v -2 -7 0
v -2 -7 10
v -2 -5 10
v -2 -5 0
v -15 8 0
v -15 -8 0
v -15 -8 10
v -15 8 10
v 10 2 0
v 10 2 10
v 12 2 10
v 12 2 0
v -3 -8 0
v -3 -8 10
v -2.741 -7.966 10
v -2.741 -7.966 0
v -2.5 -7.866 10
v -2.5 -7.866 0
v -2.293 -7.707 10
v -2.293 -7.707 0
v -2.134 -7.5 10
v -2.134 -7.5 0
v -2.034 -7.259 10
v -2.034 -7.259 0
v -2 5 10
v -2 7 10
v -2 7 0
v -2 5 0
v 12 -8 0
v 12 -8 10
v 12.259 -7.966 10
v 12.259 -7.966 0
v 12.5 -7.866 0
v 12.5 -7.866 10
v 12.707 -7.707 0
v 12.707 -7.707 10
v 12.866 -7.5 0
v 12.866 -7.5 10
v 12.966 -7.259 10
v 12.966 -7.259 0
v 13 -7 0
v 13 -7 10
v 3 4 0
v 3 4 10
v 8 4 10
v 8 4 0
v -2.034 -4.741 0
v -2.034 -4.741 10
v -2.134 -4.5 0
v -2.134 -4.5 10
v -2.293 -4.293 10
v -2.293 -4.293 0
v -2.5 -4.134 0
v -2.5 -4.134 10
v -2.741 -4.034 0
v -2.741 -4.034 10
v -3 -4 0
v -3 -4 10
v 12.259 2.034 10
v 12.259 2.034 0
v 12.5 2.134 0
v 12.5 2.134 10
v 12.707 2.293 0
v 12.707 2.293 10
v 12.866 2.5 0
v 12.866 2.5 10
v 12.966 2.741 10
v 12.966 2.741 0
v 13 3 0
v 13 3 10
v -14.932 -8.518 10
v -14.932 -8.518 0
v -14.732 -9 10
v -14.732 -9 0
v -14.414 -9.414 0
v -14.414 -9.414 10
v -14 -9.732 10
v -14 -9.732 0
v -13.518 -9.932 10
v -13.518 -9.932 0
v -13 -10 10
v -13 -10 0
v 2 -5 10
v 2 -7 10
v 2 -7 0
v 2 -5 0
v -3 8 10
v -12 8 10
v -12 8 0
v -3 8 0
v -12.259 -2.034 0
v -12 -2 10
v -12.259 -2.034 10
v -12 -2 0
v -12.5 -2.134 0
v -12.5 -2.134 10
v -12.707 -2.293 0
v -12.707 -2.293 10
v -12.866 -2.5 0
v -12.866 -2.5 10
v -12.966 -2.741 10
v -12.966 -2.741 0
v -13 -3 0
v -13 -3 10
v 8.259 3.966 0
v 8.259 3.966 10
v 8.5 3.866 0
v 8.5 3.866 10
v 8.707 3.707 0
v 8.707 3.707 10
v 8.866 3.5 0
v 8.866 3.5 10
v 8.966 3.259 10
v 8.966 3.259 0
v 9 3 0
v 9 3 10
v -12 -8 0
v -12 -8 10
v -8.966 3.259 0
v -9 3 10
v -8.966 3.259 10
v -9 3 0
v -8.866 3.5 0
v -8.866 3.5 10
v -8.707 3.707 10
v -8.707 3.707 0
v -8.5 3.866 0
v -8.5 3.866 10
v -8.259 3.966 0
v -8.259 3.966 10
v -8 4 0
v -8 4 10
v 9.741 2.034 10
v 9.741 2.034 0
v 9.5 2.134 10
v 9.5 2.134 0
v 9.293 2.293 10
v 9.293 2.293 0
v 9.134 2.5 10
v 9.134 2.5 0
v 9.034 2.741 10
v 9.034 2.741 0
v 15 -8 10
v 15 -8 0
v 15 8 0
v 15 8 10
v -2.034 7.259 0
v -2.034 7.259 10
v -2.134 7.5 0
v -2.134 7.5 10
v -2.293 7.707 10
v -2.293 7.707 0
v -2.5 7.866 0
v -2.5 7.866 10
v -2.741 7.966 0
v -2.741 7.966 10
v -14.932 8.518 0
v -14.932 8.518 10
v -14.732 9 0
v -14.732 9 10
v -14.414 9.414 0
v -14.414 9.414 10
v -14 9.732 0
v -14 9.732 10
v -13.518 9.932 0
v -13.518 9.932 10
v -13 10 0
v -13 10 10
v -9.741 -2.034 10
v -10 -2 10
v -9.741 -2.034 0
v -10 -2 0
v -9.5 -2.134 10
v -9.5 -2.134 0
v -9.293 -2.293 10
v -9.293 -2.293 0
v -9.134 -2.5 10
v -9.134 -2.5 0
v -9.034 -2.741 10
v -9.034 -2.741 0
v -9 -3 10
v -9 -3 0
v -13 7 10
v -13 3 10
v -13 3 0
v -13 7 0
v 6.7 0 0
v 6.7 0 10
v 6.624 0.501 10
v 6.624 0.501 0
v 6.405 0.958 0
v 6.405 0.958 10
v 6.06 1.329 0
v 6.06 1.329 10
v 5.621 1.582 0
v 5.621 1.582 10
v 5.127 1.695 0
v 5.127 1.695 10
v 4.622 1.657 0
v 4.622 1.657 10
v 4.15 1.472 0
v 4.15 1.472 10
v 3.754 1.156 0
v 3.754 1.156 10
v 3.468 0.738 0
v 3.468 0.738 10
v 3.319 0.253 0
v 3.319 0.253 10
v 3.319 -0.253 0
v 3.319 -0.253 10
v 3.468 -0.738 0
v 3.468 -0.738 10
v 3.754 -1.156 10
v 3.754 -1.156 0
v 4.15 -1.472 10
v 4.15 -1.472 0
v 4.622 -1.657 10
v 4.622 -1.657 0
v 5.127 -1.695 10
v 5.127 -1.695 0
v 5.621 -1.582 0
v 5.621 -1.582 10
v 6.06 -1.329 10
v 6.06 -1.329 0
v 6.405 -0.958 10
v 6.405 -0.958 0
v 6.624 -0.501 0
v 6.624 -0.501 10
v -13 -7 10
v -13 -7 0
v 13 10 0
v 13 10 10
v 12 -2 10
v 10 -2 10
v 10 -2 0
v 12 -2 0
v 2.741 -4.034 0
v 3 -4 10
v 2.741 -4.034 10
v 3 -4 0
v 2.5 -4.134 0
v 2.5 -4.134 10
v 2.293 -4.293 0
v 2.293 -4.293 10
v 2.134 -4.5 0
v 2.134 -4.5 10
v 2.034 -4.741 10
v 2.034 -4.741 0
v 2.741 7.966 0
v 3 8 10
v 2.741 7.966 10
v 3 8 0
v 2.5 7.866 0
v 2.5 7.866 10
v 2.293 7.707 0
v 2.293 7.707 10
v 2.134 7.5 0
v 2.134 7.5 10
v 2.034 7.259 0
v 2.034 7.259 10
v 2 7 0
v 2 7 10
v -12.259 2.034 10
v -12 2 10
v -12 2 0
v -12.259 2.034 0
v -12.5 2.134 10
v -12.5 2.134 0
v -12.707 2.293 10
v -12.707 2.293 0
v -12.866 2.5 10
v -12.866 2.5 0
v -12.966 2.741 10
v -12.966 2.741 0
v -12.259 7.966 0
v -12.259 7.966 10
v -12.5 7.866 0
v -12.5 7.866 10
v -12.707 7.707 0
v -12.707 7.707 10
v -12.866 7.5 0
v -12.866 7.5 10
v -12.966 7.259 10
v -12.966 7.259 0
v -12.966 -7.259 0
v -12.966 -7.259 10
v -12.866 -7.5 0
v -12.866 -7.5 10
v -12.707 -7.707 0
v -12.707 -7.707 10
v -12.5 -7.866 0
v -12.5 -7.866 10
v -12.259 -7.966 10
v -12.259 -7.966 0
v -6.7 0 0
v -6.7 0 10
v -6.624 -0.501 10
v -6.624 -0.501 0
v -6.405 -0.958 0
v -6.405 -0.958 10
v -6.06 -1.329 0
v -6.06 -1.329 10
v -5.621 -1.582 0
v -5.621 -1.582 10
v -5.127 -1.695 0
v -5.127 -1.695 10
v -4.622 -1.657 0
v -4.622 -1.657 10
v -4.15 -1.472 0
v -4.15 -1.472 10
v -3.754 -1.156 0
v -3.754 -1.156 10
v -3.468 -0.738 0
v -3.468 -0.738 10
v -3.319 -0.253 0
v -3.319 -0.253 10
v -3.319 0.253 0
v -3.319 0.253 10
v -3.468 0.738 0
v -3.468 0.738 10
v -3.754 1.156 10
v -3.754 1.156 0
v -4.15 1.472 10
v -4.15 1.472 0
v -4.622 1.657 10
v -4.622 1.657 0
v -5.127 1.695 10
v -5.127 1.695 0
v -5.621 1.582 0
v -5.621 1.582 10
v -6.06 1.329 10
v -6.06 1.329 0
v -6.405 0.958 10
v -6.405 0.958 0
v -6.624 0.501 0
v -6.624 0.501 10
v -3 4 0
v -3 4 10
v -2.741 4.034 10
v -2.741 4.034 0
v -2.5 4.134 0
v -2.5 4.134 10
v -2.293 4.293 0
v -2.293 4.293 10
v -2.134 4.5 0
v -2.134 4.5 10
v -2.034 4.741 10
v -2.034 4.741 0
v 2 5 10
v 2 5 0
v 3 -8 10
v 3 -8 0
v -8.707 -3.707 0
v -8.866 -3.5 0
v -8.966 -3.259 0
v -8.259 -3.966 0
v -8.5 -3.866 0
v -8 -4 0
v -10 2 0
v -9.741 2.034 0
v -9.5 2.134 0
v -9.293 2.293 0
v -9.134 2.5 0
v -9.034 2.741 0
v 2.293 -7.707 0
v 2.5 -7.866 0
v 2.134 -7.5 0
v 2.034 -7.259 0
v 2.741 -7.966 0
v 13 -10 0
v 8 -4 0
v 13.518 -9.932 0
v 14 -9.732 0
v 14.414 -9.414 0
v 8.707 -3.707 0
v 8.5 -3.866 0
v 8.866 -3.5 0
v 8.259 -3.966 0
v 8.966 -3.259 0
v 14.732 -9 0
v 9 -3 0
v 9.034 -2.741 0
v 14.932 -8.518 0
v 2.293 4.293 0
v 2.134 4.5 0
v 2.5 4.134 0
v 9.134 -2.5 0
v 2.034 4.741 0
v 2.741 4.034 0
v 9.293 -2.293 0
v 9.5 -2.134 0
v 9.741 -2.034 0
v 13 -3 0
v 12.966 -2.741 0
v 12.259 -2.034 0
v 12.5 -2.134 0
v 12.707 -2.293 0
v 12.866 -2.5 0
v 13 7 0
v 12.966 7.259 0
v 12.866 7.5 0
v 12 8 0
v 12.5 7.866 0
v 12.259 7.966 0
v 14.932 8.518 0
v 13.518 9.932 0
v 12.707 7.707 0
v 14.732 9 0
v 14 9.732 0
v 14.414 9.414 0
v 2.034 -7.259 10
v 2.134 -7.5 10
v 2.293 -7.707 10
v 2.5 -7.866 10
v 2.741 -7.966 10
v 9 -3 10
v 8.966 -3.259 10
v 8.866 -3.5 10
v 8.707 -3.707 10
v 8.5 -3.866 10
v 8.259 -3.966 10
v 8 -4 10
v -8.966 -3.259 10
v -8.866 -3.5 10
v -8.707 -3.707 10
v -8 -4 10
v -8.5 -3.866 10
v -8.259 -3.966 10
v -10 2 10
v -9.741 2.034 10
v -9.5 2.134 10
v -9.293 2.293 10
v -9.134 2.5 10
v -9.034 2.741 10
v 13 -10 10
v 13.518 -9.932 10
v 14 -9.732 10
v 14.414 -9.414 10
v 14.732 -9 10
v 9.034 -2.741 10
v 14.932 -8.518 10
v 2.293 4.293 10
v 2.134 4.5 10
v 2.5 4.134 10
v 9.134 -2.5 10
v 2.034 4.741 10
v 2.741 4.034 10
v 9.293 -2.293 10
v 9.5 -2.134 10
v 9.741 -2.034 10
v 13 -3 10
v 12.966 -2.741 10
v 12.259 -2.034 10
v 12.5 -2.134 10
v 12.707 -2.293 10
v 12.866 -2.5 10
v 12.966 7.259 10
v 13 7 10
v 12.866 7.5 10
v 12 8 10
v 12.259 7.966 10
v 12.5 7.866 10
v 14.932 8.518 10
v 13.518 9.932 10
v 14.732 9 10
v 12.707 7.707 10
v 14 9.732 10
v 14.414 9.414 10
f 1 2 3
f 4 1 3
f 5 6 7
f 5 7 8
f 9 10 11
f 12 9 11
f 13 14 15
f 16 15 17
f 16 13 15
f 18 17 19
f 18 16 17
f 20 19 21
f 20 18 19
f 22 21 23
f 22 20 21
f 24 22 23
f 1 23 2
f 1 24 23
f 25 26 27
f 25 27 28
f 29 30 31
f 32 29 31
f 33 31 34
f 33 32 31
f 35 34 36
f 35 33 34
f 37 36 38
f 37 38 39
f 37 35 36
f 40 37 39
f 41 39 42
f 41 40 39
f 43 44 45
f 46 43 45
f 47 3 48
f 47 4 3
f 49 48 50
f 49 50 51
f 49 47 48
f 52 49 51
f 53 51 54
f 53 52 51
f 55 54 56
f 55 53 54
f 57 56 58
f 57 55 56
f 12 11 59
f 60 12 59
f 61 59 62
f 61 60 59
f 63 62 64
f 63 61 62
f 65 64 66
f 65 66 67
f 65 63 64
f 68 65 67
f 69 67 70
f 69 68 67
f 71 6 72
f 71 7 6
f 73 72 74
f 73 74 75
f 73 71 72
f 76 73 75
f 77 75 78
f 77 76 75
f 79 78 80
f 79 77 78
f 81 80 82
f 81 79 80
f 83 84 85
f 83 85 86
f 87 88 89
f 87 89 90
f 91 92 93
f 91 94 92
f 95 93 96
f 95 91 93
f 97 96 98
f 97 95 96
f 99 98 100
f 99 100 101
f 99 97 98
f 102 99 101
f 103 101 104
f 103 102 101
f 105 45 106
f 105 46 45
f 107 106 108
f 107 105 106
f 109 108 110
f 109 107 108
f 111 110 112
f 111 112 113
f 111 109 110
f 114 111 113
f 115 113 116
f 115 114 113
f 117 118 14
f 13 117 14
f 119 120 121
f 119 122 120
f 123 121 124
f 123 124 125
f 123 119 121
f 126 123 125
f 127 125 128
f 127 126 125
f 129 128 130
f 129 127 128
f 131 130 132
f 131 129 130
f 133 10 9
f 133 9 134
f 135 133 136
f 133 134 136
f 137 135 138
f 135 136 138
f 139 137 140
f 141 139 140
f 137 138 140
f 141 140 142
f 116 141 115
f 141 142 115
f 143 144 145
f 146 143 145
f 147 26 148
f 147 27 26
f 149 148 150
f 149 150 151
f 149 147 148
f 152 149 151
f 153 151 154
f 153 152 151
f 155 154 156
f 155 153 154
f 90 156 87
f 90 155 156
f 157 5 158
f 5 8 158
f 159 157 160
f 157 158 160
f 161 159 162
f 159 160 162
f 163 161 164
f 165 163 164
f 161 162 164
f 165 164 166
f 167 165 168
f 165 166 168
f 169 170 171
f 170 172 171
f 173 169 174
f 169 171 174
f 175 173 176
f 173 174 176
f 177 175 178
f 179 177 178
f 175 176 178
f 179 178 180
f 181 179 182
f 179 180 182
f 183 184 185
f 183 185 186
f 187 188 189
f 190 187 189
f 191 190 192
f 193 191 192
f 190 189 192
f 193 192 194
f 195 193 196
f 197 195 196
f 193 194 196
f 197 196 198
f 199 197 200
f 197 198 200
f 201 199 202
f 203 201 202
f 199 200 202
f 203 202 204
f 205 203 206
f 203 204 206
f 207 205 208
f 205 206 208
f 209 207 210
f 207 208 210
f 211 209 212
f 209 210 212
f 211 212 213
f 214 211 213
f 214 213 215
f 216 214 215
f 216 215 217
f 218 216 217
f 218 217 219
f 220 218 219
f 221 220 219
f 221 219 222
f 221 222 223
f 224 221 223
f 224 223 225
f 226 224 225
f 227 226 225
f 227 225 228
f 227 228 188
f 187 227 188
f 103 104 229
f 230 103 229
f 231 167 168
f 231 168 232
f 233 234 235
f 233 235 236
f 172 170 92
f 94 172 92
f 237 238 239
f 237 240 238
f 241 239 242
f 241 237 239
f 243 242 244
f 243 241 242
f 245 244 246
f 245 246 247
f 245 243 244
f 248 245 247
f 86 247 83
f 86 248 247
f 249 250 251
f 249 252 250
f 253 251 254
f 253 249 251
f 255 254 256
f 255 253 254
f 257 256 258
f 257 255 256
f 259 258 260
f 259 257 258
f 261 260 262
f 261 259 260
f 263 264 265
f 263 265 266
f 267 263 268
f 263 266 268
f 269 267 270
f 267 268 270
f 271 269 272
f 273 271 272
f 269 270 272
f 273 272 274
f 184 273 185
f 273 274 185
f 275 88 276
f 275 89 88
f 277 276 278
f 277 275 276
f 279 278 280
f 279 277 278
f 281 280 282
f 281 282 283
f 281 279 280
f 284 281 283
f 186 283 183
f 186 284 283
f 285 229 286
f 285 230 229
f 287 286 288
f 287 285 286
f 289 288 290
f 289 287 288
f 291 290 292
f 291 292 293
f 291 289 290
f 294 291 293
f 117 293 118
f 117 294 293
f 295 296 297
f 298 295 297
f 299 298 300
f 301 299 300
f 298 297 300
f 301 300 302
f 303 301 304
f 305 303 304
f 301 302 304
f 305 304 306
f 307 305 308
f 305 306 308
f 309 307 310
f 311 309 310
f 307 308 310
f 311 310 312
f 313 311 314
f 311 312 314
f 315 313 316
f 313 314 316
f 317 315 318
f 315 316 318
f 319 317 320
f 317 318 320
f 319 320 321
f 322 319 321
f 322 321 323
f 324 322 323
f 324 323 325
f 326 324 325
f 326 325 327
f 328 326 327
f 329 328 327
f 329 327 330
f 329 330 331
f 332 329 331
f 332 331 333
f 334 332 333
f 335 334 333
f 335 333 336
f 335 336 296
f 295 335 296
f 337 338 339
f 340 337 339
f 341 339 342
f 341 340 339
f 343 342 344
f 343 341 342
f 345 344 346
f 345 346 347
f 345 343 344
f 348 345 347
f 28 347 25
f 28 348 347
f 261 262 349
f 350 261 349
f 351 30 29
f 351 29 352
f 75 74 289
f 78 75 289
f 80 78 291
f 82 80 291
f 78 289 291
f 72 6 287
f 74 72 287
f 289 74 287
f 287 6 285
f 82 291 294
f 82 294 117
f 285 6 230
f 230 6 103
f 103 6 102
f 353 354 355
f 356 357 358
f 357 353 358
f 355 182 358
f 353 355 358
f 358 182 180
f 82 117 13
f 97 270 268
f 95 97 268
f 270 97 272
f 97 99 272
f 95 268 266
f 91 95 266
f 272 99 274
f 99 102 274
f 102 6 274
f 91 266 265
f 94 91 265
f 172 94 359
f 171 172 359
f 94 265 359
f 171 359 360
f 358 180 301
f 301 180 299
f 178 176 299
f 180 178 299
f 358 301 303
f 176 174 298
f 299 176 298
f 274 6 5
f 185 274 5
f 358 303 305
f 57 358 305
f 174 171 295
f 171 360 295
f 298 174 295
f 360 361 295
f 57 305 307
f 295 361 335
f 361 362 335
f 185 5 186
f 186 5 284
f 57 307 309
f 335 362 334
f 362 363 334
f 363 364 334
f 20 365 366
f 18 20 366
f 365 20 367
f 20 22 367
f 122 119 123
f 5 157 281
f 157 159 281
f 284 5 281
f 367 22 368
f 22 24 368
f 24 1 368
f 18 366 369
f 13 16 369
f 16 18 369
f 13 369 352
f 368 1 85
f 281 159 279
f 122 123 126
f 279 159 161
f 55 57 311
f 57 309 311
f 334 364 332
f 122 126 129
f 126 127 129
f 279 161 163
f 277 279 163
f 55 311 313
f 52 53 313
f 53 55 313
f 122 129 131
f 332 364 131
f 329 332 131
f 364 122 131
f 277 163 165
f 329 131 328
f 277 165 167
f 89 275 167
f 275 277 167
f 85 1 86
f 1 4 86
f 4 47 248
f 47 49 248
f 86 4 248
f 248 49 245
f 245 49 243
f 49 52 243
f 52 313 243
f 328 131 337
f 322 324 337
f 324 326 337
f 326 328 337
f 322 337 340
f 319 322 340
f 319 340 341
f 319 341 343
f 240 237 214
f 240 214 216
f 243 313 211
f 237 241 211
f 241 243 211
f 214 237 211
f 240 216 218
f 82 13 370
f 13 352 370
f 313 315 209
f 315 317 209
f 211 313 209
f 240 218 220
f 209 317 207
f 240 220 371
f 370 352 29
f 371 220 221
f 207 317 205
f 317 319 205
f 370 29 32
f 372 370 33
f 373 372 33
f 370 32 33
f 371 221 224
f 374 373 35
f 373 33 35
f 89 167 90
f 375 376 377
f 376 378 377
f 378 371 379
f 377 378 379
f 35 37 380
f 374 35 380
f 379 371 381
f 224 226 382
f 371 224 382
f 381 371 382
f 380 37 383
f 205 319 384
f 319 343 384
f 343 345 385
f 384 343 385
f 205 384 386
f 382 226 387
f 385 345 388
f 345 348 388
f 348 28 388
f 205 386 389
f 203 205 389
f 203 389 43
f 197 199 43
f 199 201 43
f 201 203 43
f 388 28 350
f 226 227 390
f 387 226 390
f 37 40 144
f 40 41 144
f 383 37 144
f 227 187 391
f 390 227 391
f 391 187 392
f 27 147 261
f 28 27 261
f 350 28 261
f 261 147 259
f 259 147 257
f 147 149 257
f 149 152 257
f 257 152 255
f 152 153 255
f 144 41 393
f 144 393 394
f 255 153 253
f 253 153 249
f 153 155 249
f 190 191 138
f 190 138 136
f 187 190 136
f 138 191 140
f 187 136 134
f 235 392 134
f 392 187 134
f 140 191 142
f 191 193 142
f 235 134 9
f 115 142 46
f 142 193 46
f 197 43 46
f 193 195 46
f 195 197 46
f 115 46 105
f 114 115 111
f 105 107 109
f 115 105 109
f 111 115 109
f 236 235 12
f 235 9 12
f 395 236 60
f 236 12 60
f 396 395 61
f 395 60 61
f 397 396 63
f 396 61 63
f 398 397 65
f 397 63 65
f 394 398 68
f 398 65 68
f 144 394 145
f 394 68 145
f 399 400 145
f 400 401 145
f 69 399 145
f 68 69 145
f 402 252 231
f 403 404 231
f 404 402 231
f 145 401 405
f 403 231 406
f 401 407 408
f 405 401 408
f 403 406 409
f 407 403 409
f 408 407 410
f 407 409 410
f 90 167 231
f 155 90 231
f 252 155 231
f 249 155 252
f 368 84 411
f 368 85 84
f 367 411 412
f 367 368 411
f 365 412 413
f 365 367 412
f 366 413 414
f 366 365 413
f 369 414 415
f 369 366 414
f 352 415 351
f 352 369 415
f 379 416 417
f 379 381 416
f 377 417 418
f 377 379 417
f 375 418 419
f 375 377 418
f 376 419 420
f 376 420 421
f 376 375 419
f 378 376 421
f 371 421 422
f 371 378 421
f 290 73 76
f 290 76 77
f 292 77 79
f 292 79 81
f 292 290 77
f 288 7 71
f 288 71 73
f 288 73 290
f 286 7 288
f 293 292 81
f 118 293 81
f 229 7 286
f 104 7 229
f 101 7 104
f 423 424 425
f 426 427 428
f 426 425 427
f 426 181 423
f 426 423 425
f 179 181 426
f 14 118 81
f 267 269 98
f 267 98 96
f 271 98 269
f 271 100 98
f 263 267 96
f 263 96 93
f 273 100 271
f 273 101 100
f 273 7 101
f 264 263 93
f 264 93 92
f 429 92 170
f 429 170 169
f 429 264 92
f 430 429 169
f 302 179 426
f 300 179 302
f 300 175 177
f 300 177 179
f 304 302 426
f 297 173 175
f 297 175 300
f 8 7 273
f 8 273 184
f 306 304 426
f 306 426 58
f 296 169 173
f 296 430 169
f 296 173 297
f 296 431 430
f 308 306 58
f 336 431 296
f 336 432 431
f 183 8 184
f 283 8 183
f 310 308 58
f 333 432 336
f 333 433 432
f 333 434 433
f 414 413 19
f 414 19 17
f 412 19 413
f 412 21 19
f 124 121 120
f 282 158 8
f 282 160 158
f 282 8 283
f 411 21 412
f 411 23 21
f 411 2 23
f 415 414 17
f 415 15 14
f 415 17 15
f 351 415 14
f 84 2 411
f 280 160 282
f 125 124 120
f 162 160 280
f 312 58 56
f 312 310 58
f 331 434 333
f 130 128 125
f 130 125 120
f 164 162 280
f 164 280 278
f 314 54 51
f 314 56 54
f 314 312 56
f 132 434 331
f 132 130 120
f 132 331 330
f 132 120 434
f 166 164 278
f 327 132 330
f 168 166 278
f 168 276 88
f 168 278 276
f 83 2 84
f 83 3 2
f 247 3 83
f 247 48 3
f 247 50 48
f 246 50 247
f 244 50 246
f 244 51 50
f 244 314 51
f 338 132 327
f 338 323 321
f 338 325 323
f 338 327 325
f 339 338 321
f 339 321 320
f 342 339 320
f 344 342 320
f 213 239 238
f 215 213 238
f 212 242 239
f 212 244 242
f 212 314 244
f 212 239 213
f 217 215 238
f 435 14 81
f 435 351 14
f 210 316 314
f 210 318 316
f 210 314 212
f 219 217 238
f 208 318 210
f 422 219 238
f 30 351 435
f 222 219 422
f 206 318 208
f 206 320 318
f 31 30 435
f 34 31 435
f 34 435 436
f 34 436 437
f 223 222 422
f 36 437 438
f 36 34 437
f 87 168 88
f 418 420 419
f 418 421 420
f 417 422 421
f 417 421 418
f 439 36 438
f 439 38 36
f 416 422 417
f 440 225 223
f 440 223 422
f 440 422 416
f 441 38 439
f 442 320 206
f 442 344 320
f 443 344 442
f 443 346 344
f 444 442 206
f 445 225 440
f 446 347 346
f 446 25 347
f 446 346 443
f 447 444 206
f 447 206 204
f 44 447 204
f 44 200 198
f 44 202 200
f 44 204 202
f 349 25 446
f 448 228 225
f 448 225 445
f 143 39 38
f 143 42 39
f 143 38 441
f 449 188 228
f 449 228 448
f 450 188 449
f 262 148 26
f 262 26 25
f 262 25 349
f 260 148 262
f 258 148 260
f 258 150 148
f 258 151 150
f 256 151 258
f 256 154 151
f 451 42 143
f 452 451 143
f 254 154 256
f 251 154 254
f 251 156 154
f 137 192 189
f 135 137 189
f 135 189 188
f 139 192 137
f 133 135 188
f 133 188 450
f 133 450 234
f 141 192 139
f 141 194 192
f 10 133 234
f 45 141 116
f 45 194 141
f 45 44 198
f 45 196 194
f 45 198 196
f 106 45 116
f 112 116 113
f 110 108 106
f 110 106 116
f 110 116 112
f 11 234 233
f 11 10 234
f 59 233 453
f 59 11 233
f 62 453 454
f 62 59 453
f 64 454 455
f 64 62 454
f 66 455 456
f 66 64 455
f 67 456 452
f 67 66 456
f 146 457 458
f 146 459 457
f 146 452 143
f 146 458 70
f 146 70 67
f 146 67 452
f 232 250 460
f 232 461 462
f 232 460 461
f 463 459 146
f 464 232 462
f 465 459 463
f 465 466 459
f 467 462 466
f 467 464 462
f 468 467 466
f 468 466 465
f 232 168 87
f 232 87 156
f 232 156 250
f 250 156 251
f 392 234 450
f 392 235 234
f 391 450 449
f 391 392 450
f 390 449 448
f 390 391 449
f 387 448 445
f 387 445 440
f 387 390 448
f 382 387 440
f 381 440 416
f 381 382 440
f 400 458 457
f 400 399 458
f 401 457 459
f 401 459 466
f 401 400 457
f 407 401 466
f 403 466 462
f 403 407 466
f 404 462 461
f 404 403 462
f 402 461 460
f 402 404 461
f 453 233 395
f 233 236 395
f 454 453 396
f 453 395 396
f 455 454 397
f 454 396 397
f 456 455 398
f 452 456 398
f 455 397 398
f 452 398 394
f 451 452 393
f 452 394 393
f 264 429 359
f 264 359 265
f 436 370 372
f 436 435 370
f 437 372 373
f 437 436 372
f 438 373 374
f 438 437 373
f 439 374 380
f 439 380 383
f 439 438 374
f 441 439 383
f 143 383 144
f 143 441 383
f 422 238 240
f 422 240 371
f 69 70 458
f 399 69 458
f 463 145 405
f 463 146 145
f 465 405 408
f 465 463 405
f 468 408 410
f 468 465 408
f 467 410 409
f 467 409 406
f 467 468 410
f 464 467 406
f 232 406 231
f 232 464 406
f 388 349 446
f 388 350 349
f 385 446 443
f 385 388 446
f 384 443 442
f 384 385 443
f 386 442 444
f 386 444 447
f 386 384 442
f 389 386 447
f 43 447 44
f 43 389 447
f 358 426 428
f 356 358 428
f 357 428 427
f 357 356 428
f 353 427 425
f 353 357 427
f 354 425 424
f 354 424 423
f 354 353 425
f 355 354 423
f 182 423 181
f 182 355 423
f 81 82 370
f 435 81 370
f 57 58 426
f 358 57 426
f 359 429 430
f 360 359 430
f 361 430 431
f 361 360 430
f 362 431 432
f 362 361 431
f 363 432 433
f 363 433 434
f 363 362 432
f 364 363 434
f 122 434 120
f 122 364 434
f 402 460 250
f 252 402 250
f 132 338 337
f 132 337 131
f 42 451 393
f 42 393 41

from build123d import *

# Parameters (mm, degrees)
SKETCH_1_W          = 30
SKETCH_1_H          = 20
EXTRUDE_1_DEPTH     = 10
FILLET_1_R          = 2
SKETCH_2_R          = 1.7
CUT_EXTRUDE_1_DEPTH = 21.615528128
CUT_EXTRUDE_2_DEPTH = 21.615528128
FILLET_2_R          = 1


with BuildPart() as part:
    # 草图1 → 凸台-拉伸1 (new body)
    with BuildSketch(Plane.XY):
        Rectangle(SKETCH_1_W, SKETCH_1_H)
    extrude(amount=EXTRUDE_1_DEPTH)

    # 圆角1
    fillet_1_edges = [part.edges().sort_by_distance(p)[0] for p in [
        (15, -10, 5),
        (-15, -10, 5),
        (-15, 10, 5),
        (15, 10, 5),
    ]]
    fillet(fillet_1_edges, radius=FILLET_1_R)

    # 草图2 → 切除-拉伸1 (cut, through all)
    with BuildSketch(Plane.XY.offset(10)):
        with Locations((5, 0)):
            Circle(SKETCH_2_R)
        with Locations(Location((-5, 0, 0), (0, 0, 180))):
            Circle(SKETCH_2_R)
    extrude(amount=-CUT_EXTRUDE_1_DEPTH, mode=Mode.SUBTRACT)

    # 草图3 → 切除-拉伸2 (cut, through all)
    with BuildSketch(Plane.XY.offset(10)):
        Polygon((-13, 2), (-13, 8), (-2, 8), (-2, 4), (-9, 4), (-9, 2), align=None)
        Polygon((9, 2), (13, 2), (13, 8), (2, 8), (2, 4), (9, 4), align=None)
        Polygon((13, -2), (13, -8), (2, -8), (2, -4), (9, -4), (9, -2), align=None)
        Polygon((-9, -2), (-13, -2), (-13, -8), (-2, -8), (-2, -4), (-9, -4), align=None)
    extrude(amount=-CUT_EXTRUDE_2_DEPTH, mode=Mode.SUBTRACT)

    # 圆角2
    fillet_2_edges = [part.edges().sort_by_distance(p)[0] for p in [
        (-2, -4, 5),
        (2, 8, 5),
        (13, 8, 5),
        (13, 2, 5),
        (2, 4, 5),
        (9, 2, 5),
        (9, 4, 5),
        (13, -2, 5),
        (2, -8, 5),
        (2, -4, 5),
        (9, -2, 5),
        (9, -4, 5),
        (13, -8, 5),
        (-2, -8, 5),
        (-13, -8, 5),
        (-13, -2, 5),
        (-9, -2, 5),
        (-9, -4, 5),
        (-2, 8, 5),
        (-2, 4, 5),
        (-9, 4, 5),
        (-9, 2, 5),
        (-13, 2, 5),
        (-13, 8, 5),
    ]]
    fillet(fillet_2_edges, radius=FILLET_2_R - 0.0001)  # a hair under: the kernel refuses the full size


solid = part.part
